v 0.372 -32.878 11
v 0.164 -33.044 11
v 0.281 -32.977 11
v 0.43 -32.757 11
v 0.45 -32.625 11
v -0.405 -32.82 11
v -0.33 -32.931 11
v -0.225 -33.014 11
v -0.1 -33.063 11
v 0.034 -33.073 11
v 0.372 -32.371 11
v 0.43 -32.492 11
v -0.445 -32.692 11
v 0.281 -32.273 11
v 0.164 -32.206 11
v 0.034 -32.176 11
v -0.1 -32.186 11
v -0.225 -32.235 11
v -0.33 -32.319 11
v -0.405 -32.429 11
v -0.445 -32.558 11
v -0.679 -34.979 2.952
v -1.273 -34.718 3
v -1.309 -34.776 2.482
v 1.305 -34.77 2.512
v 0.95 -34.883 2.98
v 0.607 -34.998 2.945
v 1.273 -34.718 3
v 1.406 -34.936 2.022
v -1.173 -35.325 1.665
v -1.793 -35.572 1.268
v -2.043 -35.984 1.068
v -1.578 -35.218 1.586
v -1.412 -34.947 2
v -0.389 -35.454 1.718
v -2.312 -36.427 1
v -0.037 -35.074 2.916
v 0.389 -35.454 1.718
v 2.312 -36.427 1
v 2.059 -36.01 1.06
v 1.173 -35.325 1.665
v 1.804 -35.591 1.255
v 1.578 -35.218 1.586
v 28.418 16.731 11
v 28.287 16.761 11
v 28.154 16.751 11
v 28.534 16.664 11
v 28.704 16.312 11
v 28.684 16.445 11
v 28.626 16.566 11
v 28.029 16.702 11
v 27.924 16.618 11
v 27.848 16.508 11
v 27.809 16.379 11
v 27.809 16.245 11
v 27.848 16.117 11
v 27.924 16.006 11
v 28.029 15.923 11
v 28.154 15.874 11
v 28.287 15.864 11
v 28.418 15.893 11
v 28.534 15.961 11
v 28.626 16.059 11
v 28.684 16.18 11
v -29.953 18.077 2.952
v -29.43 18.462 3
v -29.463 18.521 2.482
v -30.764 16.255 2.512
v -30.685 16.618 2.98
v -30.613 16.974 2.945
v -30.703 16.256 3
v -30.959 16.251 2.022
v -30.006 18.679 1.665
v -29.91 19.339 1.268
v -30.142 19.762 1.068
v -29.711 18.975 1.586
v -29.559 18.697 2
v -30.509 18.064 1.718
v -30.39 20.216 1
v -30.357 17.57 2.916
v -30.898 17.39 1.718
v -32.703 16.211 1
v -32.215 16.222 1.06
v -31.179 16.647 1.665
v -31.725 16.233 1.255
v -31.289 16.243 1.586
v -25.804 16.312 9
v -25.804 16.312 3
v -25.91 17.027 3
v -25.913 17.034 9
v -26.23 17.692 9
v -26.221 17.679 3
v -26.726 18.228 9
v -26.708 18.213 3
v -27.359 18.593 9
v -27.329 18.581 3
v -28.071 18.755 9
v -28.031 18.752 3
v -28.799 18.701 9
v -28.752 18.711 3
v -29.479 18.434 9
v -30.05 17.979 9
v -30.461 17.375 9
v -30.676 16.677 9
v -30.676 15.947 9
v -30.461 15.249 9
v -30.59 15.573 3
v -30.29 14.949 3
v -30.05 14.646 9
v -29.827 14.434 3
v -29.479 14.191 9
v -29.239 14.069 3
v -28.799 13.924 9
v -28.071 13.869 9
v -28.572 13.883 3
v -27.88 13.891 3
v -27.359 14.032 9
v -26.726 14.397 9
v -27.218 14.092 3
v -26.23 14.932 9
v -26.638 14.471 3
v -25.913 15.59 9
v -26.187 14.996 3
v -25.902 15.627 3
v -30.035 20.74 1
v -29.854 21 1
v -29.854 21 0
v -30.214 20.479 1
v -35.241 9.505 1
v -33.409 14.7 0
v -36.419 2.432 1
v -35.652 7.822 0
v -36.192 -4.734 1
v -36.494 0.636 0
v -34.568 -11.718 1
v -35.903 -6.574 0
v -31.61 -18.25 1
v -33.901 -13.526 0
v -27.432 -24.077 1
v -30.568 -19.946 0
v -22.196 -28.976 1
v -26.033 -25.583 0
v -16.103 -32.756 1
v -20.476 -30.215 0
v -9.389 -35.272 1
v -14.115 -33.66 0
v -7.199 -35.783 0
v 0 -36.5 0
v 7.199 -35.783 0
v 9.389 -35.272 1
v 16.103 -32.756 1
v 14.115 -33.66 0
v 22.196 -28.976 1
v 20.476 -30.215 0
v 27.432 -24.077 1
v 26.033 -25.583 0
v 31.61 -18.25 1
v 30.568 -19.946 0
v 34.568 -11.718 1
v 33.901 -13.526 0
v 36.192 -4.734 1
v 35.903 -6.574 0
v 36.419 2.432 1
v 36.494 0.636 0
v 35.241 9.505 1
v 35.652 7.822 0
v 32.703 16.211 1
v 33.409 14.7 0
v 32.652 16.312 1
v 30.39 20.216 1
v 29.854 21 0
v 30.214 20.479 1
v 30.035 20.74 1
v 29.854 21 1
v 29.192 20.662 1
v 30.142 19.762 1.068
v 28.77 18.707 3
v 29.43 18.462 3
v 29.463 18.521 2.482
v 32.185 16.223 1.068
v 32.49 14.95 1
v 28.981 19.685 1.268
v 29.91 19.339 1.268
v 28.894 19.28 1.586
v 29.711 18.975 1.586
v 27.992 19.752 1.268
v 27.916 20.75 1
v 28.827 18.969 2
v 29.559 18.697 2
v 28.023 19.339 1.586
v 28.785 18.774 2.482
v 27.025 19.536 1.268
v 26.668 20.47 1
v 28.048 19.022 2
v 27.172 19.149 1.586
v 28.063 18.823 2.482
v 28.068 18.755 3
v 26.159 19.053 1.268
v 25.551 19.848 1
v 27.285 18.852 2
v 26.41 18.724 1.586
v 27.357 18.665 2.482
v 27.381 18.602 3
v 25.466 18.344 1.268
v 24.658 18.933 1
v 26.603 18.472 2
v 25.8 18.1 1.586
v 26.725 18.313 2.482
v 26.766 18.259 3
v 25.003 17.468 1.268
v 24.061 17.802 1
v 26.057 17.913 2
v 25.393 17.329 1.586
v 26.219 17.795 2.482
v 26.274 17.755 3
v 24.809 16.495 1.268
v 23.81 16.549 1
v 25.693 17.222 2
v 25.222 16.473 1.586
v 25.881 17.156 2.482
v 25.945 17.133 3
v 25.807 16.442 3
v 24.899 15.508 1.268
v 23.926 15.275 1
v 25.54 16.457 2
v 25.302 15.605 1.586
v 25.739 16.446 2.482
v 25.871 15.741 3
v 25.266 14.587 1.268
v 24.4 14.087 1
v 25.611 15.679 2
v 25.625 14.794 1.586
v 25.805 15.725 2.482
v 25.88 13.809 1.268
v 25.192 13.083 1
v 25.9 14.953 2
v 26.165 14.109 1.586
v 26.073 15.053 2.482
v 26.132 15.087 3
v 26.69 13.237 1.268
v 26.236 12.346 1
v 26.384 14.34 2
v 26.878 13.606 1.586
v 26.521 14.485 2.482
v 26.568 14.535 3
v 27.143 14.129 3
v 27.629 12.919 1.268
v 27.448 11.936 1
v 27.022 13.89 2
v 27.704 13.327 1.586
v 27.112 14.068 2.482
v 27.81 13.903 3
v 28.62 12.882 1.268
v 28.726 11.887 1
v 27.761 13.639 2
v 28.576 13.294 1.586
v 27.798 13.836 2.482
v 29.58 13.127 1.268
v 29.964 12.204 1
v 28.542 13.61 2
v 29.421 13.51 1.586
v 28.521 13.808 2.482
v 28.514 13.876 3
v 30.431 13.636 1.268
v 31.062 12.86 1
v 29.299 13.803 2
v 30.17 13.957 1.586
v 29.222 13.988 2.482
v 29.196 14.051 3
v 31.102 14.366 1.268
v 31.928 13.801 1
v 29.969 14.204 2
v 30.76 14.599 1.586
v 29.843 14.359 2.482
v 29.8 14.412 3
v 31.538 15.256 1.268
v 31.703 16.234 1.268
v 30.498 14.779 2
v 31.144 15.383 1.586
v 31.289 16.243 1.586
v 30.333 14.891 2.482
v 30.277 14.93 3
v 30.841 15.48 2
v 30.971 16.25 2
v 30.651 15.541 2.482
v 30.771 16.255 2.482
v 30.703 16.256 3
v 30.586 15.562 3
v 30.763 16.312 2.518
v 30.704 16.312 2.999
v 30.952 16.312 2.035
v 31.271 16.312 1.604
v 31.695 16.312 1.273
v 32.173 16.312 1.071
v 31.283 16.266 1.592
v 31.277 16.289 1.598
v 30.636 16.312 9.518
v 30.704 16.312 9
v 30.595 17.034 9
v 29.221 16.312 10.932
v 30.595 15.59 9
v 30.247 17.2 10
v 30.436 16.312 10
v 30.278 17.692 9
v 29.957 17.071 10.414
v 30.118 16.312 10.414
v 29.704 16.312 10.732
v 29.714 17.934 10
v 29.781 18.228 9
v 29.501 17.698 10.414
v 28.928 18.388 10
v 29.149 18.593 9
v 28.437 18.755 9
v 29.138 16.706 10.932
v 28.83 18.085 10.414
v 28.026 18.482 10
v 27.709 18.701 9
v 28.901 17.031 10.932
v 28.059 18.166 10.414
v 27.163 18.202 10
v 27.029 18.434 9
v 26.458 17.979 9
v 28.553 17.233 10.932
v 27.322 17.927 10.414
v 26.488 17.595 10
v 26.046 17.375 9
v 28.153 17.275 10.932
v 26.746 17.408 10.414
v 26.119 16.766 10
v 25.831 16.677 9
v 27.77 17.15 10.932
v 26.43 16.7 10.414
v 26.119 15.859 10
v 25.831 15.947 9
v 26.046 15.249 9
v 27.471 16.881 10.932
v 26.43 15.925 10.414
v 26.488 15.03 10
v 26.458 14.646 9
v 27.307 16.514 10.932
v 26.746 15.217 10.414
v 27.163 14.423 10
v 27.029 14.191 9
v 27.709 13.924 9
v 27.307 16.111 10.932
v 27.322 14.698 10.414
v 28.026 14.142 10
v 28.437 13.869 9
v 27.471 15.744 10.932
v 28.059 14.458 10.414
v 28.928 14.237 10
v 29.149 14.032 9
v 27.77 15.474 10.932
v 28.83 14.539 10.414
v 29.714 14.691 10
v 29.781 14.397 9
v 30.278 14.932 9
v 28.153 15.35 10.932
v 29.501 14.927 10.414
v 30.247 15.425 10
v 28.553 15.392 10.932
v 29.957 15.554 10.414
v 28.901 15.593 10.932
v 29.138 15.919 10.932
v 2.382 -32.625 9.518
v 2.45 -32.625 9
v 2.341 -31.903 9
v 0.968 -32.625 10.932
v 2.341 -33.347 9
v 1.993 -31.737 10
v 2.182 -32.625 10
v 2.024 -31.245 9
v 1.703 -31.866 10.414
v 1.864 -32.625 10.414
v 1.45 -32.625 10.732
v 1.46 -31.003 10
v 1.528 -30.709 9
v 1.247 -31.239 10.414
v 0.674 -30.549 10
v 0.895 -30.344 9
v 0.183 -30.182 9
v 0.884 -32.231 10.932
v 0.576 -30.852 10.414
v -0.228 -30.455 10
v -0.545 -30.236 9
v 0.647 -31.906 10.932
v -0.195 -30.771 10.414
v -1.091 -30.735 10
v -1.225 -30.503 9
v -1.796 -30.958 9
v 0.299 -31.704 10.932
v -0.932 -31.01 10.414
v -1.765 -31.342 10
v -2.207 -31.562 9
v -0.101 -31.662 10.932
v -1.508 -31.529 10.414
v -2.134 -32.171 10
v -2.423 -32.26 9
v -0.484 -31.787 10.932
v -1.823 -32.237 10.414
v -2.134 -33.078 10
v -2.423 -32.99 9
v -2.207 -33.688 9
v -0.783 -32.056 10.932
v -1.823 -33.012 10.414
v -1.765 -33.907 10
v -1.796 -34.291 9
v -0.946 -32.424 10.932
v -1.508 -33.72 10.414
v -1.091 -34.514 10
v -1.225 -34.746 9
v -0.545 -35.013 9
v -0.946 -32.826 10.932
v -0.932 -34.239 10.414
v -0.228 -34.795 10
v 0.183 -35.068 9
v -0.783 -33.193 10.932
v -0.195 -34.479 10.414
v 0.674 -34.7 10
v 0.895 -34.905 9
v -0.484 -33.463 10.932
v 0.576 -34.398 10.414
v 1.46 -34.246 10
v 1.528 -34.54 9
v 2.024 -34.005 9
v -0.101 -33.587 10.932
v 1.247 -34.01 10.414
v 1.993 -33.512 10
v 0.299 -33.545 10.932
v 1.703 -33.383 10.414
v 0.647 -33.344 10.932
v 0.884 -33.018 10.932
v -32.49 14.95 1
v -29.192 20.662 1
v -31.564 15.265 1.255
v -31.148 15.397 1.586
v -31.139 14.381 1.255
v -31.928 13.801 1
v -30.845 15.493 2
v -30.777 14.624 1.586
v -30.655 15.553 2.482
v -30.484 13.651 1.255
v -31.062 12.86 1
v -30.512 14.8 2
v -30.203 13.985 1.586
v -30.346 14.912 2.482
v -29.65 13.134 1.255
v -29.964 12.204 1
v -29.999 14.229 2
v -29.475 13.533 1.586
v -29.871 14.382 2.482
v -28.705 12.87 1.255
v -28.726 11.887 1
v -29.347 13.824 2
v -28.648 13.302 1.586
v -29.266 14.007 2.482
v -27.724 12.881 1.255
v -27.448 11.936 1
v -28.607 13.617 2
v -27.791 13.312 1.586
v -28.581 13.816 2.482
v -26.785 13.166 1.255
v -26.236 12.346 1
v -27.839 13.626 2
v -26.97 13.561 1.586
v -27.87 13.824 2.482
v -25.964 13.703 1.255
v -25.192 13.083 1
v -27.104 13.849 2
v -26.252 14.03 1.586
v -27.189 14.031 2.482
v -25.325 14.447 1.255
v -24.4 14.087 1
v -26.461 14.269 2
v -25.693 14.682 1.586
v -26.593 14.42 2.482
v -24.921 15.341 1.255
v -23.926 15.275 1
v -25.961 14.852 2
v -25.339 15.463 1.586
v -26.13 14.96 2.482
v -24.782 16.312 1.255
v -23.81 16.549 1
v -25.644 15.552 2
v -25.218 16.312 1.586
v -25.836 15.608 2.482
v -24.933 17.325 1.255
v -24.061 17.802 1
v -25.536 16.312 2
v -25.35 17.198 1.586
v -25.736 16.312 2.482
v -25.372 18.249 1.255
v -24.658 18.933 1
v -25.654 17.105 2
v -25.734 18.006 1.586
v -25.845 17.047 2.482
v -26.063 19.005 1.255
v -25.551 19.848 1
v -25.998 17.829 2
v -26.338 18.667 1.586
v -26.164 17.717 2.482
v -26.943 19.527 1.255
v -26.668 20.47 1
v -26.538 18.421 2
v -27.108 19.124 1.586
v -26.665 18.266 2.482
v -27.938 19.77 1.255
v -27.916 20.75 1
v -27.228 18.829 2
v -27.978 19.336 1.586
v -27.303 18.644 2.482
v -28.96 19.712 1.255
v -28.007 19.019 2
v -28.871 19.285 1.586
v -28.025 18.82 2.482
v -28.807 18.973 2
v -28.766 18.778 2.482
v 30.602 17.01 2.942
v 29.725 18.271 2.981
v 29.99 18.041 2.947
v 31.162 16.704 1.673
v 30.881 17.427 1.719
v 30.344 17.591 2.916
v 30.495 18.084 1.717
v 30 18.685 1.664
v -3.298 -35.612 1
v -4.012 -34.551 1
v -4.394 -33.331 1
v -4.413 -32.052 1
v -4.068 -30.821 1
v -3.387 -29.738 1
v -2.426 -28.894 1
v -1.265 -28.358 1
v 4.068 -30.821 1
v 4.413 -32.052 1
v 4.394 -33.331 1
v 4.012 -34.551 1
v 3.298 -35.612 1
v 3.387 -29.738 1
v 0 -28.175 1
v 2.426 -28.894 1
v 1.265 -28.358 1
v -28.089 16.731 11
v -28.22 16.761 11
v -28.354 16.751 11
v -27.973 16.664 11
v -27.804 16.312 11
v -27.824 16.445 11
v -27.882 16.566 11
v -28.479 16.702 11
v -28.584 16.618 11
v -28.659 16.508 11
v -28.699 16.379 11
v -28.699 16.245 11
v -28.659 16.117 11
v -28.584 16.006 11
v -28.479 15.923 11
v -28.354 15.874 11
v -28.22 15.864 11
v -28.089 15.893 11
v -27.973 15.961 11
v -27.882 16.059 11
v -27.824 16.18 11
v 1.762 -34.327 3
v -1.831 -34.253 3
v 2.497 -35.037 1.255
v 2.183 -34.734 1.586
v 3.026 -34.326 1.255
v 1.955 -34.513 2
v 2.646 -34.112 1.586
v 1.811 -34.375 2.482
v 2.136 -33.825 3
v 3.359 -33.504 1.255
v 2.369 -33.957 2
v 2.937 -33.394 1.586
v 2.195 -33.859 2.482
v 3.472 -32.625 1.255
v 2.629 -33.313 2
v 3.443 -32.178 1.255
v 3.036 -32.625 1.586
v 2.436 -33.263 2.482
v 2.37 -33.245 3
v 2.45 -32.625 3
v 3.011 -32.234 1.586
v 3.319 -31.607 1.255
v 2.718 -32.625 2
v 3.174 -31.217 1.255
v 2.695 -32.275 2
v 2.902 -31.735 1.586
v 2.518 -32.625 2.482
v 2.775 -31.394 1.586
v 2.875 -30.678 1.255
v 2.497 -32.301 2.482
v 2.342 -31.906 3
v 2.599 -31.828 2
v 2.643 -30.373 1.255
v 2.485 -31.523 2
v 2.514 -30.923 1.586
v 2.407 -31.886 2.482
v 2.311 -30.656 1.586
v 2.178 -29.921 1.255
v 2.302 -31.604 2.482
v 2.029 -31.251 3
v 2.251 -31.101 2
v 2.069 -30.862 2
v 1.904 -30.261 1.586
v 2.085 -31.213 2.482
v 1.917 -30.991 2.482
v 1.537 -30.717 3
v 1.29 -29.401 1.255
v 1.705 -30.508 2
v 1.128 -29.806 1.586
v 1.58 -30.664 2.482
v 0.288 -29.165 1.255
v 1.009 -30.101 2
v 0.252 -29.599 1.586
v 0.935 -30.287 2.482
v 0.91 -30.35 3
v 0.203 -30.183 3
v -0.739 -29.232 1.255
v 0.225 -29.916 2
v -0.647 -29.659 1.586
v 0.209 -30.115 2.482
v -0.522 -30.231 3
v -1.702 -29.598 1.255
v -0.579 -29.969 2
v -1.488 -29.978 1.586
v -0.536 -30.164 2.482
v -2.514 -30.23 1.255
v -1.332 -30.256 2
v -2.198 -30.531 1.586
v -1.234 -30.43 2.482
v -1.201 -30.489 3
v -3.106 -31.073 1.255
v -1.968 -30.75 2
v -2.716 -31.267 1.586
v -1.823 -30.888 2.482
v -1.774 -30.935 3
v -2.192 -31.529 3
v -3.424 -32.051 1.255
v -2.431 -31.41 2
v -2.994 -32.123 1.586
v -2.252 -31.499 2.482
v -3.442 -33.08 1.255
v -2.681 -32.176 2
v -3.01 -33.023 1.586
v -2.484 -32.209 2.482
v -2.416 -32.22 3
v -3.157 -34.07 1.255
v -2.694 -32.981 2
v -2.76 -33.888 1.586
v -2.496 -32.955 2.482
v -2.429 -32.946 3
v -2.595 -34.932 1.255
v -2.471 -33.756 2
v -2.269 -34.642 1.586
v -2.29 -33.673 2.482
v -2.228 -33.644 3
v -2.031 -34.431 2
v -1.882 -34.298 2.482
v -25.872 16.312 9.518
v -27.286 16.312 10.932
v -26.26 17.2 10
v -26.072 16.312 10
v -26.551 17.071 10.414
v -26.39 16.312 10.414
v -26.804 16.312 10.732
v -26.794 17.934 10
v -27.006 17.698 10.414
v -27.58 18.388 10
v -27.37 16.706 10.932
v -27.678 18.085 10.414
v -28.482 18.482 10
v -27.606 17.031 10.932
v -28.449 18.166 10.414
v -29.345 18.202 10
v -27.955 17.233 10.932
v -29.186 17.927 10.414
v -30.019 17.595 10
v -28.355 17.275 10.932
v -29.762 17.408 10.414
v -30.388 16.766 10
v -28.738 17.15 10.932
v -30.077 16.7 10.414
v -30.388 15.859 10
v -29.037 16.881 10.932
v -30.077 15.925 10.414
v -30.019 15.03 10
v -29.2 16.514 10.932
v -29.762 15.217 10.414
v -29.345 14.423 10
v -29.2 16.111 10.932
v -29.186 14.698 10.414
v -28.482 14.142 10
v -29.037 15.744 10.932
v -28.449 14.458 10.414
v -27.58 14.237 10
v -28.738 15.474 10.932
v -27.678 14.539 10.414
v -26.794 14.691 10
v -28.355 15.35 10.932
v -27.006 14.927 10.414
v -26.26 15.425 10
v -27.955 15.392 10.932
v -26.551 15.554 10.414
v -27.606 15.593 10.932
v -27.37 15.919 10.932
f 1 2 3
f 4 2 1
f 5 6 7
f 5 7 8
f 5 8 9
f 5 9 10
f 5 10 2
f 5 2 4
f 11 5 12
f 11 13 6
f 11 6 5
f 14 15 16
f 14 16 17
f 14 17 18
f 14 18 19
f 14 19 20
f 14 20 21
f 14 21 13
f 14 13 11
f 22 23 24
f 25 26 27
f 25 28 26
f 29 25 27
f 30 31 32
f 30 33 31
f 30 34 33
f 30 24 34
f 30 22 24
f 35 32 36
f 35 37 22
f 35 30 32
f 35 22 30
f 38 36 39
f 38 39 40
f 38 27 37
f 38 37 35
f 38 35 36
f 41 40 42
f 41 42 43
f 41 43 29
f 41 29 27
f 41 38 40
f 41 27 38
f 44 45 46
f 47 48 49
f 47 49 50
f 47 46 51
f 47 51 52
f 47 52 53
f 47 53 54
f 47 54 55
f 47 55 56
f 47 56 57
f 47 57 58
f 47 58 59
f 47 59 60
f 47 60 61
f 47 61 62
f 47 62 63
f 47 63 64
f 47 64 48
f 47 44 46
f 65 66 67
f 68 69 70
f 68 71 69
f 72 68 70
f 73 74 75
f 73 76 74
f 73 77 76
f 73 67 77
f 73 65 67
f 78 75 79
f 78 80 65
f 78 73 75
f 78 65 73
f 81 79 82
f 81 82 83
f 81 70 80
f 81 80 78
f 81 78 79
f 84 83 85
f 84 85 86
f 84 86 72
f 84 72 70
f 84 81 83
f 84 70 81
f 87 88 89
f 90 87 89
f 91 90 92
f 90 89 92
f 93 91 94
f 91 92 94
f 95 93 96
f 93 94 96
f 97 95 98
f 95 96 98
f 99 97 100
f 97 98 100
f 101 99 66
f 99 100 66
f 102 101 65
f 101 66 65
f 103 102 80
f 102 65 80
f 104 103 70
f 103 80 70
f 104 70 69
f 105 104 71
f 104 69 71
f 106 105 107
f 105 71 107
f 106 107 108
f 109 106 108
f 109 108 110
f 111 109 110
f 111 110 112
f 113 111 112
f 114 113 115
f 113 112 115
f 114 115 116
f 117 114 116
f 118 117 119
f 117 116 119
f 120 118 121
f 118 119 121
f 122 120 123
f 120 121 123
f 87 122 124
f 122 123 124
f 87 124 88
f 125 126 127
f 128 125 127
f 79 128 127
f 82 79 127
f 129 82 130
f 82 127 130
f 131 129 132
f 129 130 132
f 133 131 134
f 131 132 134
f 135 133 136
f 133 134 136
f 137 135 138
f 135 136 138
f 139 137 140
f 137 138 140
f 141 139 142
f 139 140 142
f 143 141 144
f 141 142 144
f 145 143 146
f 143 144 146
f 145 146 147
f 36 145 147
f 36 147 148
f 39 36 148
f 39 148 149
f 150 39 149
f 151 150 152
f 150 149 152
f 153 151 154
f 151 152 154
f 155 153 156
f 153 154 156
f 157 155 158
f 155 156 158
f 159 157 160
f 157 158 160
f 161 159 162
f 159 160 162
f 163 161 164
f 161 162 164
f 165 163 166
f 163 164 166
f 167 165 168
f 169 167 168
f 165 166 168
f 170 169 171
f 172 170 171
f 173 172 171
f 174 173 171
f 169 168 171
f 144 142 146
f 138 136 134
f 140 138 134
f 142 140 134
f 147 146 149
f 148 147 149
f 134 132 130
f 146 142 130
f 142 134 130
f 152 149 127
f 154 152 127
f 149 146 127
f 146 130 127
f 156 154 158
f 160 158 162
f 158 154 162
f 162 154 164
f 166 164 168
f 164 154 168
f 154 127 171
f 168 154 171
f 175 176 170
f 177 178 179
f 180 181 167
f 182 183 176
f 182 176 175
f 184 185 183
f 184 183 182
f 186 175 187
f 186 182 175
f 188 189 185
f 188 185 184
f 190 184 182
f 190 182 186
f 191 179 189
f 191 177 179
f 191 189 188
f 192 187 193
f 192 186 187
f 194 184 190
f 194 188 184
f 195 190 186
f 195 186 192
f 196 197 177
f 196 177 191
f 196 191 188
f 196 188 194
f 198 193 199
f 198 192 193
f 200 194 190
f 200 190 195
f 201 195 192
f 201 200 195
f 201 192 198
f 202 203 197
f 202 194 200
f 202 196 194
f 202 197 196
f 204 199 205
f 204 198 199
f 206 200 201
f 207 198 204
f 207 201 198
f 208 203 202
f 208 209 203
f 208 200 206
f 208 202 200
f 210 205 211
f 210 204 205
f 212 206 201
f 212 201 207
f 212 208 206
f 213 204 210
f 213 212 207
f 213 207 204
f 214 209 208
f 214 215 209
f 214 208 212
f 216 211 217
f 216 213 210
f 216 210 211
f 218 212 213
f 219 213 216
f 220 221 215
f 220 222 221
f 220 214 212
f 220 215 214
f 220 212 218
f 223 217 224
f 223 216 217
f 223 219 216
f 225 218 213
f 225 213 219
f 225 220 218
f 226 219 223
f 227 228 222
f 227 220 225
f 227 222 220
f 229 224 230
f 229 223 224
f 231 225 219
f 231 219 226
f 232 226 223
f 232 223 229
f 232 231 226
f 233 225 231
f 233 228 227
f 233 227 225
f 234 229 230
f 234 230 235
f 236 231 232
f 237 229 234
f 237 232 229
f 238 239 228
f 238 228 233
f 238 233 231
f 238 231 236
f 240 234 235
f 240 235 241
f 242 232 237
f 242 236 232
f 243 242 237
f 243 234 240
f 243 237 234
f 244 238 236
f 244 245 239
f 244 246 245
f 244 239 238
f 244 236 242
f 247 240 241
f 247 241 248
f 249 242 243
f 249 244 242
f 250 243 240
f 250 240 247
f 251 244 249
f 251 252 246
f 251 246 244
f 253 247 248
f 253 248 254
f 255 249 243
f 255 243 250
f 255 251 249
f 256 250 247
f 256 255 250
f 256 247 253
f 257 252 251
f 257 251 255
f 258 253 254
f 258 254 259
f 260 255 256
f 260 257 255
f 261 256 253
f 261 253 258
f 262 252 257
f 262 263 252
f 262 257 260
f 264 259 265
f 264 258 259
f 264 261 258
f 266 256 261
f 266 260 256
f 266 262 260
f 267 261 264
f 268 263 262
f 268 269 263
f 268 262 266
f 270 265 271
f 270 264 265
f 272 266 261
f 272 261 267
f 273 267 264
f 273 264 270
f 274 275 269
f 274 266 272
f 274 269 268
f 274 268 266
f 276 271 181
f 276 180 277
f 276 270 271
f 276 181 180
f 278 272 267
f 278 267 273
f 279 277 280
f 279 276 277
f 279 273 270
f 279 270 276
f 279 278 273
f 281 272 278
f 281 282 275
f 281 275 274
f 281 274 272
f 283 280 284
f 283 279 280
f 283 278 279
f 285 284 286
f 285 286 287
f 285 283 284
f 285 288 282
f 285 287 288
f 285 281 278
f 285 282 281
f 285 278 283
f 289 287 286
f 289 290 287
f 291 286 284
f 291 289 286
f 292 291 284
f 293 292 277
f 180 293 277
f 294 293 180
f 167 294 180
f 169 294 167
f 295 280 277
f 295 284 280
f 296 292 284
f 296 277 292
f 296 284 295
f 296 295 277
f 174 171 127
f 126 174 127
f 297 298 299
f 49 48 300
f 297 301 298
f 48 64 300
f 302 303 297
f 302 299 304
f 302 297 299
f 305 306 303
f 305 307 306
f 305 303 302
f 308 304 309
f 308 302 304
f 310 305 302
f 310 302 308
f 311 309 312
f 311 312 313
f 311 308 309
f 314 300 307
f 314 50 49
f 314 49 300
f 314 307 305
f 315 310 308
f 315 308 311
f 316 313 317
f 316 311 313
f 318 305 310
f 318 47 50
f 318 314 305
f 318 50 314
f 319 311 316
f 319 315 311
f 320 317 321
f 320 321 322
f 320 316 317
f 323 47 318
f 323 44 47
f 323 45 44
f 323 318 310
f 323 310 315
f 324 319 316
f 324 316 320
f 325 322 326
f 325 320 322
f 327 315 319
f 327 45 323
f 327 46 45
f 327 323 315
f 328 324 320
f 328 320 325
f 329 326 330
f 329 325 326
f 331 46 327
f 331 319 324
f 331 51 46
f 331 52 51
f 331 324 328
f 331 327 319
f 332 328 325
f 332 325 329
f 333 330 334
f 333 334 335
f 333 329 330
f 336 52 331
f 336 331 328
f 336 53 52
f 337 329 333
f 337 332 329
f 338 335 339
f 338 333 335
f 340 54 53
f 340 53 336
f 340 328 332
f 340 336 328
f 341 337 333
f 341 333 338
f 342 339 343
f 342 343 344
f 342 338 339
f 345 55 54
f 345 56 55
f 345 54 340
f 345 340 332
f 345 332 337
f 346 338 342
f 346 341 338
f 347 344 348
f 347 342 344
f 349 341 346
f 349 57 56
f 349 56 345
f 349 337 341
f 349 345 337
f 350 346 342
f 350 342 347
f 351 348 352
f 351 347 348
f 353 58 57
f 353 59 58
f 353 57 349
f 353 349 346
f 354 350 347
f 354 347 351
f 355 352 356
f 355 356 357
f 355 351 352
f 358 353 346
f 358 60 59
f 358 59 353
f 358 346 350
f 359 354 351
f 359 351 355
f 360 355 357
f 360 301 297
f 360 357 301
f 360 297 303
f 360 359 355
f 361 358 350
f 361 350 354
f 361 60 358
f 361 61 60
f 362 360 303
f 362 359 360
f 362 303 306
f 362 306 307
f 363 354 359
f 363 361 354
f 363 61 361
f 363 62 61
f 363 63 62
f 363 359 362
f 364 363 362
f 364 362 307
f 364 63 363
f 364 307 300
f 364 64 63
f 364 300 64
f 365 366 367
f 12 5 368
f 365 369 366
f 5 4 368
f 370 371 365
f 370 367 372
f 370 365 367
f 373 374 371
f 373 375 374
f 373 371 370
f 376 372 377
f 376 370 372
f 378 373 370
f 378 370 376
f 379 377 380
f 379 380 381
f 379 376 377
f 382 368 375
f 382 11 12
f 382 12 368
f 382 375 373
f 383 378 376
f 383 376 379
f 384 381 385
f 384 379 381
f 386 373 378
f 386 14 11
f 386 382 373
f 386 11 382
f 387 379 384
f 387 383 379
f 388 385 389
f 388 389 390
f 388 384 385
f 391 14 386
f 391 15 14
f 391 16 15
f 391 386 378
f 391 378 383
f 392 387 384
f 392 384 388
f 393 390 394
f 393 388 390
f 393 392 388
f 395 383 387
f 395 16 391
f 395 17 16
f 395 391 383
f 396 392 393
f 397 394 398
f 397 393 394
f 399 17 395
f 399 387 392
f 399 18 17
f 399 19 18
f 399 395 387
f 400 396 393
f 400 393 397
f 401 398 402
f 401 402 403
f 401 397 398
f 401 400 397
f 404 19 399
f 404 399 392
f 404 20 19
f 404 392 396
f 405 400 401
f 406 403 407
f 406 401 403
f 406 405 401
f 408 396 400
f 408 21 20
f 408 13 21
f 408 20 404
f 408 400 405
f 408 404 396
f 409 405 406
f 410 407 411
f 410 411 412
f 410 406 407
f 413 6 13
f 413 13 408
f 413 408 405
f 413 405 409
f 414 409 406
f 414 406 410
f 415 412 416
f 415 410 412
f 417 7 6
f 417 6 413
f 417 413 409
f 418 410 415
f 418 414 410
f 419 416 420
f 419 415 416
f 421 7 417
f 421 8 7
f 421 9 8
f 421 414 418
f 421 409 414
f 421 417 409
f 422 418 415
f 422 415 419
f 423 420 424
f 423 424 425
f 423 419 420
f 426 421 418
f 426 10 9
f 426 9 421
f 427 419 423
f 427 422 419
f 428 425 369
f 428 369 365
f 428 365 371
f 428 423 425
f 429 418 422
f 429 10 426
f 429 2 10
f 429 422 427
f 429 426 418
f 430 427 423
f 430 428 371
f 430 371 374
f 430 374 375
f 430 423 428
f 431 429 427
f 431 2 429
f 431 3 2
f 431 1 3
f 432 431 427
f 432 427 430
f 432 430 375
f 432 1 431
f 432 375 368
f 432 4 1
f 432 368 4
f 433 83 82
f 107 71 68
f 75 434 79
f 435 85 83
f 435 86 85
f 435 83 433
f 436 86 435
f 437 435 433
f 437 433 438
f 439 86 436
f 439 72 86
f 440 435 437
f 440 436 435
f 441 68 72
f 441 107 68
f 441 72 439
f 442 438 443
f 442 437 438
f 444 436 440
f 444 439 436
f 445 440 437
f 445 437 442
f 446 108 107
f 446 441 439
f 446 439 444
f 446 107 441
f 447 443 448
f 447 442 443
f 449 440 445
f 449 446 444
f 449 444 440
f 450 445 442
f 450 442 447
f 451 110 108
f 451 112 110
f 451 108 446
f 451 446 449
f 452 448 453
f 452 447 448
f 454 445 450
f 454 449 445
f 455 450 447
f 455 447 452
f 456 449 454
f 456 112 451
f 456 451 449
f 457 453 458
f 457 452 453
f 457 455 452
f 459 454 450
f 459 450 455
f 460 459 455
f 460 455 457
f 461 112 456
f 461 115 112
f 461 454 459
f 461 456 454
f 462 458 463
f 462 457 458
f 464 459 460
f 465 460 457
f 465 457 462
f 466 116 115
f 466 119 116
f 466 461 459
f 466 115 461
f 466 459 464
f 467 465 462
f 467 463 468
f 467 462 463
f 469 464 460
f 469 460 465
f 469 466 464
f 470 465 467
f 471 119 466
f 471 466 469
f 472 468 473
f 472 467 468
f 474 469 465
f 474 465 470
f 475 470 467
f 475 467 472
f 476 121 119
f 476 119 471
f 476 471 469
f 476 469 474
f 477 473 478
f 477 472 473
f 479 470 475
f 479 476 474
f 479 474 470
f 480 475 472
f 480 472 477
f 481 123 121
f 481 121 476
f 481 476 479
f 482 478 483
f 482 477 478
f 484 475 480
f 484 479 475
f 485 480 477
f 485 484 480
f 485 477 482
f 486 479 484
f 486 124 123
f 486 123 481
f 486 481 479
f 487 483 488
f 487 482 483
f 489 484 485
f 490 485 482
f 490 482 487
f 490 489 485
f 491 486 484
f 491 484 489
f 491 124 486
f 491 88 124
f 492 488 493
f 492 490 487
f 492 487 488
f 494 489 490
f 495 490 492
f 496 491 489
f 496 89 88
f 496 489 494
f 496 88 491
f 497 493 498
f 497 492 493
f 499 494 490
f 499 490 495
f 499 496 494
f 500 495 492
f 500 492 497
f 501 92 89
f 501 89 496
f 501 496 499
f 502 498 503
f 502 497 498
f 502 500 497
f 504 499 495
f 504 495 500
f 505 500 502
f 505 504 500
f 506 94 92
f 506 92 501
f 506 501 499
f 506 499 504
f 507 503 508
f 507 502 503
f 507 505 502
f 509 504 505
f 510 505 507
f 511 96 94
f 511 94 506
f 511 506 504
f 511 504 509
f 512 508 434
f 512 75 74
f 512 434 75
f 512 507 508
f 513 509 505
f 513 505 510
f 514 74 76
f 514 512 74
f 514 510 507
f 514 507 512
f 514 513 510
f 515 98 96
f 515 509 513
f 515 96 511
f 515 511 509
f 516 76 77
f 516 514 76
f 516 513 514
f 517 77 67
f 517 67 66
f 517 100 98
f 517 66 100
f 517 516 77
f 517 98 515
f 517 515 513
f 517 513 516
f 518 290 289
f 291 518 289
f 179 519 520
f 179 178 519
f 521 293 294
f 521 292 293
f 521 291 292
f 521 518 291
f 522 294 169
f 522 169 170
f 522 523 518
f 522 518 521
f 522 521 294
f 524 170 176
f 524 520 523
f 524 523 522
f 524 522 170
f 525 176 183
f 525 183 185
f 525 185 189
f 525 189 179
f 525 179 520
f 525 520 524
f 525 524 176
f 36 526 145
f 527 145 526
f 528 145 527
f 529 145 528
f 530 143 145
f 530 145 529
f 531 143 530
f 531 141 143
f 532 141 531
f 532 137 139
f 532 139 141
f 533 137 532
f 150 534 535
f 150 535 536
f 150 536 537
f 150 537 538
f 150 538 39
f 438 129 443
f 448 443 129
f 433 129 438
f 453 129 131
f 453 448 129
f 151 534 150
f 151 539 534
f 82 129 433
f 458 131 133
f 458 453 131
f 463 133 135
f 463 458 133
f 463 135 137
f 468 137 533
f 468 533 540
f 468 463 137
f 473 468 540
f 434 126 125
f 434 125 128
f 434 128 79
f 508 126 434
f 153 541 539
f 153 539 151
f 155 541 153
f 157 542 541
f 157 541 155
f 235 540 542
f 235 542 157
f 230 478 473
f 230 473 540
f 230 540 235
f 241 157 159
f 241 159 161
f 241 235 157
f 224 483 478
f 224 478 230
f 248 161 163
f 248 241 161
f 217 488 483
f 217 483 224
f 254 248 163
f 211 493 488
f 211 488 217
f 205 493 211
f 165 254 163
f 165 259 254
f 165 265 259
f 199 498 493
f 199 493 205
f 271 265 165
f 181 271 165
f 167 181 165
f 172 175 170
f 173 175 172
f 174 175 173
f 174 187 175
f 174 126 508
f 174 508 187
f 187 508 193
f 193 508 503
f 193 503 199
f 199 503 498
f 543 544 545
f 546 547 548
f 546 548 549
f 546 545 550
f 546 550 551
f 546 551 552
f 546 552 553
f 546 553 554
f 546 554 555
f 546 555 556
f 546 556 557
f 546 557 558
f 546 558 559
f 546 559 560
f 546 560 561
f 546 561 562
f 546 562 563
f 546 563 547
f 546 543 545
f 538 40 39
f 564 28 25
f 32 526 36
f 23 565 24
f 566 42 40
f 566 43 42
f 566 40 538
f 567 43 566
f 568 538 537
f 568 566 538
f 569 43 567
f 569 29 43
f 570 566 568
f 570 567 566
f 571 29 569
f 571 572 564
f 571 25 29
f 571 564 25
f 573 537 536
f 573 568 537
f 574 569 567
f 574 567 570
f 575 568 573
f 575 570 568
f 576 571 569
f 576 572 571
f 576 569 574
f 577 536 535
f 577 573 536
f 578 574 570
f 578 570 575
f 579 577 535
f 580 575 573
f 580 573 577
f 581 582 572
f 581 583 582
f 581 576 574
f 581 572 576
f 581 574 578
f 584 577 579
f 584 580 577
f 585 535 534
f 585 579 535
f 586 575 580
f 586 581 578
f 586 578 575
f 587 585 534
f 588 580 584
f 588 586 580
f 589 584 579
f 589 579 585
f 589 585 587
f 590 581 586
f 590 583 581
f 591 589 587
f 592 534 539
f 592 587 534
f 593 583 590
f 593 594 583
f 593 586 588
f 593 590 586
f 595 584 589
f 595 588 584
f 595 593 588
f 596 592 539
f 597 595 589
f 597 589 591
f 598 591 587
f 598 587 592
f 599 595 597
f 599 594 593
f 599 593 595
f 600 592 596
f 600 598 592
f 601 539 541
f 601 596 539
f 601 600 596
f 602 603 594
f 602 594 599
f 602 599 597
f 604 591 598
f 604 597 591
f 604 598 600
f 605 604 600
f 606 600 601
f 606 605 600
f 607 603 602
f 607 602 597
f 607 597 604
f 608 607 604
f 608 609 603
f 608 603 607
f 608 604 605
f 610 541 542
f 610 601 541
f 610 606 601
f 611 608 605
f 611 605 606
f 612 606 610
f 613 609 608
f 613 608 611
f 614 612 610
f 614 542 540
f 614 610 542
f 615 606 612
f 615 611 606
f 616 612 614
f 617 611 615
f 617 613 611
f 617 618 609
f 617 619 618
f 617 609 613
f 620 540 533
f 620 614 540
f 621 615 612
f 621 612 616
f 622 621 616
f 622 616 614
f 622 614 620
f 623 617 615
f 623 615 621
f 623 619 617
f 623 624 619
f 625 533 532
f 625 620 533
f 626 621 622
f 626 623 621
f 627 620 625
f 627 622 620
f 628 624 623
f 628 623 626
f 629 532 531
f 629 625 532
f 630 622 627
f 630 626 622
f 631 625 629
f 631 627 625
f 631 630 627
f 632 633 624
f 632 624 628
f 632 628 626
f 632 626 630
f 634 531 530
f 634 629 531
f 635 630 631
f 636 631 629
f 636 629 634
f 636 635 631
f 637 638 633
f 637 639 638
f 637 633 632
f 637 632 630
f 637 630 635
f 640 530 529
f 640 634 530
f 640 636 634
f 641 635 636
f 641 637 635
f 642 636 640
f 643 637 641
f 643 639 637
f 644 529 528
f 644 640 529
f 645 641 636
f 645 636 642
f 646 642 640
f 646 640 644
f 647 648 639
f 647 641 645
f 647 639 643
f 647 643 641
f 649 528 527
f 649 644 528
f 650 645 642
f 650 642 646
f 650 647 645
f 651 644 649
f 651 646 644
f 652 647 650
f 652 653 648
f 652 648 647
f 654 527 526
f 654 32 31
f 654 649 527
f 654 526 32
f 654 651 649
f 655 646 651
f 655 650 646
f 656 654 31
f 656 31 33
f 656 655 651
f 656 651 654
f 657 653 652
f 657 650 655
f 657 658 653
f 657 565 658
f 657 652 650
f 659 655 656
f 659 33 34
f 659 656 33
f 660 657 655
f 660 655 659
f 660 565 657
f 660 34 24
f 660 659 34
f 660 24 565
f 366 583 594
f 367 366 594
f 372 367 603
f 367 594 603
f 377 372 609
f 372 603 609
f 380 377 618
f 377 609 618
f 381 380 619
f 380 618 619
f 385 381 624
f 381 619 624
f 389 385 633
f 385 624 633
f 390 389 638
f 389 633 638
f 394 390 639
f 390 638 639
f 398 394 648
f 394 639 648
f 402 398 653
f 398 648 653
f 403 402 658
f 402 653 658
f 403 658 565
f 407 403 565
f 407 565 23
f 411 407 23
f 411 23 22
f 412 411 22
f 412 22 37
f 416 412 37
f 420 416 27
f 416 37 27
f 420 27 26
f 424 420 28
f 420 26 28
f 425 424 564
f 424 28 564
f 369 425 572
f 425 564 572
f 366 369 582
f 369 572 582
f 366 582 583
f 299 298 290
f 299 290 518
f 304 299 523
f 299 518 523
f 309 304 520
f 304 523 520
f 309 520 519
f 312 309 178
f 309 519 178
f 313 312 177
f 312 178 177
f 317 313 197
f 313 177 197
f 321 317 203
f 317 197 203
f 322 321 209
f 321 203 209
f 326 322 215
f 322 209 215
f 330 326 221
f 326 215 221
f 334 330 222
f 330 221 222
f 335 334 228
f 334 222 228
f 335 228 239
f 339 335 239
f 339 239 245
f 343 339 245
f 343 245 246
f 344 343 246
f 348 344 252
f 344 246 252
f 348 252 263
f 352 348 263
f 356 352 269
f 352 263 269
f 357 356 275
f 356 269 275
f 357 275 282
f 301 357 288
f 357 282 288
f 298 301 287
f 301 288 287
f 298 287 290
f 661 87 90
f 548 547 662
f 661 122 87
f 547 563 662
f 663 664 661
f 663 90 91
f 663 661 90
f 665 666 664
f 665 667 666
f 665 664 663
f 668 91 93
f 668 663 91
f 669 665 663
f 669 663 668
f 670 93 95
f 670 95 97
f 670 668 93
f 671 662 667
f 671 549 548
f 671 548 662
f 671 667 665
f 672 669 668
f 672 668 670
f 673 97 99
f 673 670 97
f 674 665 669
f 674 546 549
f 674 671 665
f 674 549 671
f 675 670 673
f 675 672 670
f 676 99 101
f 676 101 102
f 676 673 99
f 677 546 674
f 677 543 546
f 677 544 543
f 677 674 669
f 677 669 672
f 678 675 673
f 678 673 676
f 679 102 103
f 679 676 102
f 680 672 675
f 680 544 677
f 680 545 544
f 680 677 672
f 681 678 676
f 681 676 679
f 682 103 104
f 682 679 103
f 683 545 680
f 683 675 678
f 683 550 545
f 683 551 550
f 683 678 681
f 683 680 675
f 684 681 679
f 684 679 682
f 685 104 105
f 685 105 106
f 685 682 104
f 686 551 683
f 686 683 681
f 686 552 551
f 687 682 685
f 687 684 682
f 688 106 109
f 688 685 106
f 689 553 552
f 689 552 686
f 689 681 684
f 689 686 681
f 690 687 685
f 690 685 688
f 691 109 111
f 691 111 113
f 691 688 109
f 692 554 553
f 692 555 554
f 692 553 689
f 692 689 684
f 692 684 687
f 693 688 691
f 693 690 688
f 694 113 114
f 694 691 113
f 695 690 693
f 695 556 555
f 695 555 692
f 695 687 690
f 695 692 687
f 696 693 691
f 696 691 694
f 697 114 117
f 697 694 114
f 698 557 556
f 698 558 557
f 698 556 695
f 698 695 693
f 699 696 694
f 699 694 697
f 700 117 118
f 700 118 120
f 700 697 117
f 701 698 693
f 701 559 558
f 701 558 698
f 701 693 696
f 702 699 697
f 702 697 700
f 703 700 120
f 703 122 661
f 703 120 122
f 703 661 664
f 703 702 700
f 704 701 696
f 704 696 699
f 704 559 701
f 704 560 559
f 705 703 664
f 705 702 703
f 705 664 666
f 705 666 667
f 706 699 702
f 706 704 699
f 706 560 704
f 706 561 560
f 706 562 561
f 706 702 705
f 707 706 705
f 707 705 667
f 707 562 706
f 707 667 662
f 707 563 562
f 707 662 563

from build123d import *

# Parameters (mm, degrees)
F1_DEPTH = 1
F2_R     = 2.45
F3_DEPTH = 10
F4_R     = 2


with BuildPart() as f1:
    # F0 (on Top) → F1 (new body)
    with BuildSketch(Plane.XY):
        with BuildLine():
            Line((29.85381, 21), (-29.85381, 21))
            ThreePointArc((-29.85381, 21), (0, -36.5), (29.85381, 21))
        make_face()
    extrude(amount=F1_DEPTH)

    # F2 (on face) → F3 (join)
    with BuildSketch(Plane.XY.offset(1)):
        with Locations((-28.25381, 16.312345)):
            Circle(F2_R)
        with Locations((28.25381, 16.312345)):
            Circle(F2_R)
        with Locations((0, -32.62469)):
            Circle(F2_R)
    extrude(amount=F3_DEPTH)

    # F4
    f4_edges = [f1.edges().sort_by_distance(p)[0] for p in [
        (-30.70381, 16.312345, 11),
        (25.80381, 16.312345, 11),
        (-2.45, -32.62469, 11),
        (-30.70381, 16.312345, 1),
        (25.80381, 16.312345, 1),
        (-2.45, -32.62469, 1),
    ]]
    fillet(f4_edges, radius=F4_R)


solid = f1.part
